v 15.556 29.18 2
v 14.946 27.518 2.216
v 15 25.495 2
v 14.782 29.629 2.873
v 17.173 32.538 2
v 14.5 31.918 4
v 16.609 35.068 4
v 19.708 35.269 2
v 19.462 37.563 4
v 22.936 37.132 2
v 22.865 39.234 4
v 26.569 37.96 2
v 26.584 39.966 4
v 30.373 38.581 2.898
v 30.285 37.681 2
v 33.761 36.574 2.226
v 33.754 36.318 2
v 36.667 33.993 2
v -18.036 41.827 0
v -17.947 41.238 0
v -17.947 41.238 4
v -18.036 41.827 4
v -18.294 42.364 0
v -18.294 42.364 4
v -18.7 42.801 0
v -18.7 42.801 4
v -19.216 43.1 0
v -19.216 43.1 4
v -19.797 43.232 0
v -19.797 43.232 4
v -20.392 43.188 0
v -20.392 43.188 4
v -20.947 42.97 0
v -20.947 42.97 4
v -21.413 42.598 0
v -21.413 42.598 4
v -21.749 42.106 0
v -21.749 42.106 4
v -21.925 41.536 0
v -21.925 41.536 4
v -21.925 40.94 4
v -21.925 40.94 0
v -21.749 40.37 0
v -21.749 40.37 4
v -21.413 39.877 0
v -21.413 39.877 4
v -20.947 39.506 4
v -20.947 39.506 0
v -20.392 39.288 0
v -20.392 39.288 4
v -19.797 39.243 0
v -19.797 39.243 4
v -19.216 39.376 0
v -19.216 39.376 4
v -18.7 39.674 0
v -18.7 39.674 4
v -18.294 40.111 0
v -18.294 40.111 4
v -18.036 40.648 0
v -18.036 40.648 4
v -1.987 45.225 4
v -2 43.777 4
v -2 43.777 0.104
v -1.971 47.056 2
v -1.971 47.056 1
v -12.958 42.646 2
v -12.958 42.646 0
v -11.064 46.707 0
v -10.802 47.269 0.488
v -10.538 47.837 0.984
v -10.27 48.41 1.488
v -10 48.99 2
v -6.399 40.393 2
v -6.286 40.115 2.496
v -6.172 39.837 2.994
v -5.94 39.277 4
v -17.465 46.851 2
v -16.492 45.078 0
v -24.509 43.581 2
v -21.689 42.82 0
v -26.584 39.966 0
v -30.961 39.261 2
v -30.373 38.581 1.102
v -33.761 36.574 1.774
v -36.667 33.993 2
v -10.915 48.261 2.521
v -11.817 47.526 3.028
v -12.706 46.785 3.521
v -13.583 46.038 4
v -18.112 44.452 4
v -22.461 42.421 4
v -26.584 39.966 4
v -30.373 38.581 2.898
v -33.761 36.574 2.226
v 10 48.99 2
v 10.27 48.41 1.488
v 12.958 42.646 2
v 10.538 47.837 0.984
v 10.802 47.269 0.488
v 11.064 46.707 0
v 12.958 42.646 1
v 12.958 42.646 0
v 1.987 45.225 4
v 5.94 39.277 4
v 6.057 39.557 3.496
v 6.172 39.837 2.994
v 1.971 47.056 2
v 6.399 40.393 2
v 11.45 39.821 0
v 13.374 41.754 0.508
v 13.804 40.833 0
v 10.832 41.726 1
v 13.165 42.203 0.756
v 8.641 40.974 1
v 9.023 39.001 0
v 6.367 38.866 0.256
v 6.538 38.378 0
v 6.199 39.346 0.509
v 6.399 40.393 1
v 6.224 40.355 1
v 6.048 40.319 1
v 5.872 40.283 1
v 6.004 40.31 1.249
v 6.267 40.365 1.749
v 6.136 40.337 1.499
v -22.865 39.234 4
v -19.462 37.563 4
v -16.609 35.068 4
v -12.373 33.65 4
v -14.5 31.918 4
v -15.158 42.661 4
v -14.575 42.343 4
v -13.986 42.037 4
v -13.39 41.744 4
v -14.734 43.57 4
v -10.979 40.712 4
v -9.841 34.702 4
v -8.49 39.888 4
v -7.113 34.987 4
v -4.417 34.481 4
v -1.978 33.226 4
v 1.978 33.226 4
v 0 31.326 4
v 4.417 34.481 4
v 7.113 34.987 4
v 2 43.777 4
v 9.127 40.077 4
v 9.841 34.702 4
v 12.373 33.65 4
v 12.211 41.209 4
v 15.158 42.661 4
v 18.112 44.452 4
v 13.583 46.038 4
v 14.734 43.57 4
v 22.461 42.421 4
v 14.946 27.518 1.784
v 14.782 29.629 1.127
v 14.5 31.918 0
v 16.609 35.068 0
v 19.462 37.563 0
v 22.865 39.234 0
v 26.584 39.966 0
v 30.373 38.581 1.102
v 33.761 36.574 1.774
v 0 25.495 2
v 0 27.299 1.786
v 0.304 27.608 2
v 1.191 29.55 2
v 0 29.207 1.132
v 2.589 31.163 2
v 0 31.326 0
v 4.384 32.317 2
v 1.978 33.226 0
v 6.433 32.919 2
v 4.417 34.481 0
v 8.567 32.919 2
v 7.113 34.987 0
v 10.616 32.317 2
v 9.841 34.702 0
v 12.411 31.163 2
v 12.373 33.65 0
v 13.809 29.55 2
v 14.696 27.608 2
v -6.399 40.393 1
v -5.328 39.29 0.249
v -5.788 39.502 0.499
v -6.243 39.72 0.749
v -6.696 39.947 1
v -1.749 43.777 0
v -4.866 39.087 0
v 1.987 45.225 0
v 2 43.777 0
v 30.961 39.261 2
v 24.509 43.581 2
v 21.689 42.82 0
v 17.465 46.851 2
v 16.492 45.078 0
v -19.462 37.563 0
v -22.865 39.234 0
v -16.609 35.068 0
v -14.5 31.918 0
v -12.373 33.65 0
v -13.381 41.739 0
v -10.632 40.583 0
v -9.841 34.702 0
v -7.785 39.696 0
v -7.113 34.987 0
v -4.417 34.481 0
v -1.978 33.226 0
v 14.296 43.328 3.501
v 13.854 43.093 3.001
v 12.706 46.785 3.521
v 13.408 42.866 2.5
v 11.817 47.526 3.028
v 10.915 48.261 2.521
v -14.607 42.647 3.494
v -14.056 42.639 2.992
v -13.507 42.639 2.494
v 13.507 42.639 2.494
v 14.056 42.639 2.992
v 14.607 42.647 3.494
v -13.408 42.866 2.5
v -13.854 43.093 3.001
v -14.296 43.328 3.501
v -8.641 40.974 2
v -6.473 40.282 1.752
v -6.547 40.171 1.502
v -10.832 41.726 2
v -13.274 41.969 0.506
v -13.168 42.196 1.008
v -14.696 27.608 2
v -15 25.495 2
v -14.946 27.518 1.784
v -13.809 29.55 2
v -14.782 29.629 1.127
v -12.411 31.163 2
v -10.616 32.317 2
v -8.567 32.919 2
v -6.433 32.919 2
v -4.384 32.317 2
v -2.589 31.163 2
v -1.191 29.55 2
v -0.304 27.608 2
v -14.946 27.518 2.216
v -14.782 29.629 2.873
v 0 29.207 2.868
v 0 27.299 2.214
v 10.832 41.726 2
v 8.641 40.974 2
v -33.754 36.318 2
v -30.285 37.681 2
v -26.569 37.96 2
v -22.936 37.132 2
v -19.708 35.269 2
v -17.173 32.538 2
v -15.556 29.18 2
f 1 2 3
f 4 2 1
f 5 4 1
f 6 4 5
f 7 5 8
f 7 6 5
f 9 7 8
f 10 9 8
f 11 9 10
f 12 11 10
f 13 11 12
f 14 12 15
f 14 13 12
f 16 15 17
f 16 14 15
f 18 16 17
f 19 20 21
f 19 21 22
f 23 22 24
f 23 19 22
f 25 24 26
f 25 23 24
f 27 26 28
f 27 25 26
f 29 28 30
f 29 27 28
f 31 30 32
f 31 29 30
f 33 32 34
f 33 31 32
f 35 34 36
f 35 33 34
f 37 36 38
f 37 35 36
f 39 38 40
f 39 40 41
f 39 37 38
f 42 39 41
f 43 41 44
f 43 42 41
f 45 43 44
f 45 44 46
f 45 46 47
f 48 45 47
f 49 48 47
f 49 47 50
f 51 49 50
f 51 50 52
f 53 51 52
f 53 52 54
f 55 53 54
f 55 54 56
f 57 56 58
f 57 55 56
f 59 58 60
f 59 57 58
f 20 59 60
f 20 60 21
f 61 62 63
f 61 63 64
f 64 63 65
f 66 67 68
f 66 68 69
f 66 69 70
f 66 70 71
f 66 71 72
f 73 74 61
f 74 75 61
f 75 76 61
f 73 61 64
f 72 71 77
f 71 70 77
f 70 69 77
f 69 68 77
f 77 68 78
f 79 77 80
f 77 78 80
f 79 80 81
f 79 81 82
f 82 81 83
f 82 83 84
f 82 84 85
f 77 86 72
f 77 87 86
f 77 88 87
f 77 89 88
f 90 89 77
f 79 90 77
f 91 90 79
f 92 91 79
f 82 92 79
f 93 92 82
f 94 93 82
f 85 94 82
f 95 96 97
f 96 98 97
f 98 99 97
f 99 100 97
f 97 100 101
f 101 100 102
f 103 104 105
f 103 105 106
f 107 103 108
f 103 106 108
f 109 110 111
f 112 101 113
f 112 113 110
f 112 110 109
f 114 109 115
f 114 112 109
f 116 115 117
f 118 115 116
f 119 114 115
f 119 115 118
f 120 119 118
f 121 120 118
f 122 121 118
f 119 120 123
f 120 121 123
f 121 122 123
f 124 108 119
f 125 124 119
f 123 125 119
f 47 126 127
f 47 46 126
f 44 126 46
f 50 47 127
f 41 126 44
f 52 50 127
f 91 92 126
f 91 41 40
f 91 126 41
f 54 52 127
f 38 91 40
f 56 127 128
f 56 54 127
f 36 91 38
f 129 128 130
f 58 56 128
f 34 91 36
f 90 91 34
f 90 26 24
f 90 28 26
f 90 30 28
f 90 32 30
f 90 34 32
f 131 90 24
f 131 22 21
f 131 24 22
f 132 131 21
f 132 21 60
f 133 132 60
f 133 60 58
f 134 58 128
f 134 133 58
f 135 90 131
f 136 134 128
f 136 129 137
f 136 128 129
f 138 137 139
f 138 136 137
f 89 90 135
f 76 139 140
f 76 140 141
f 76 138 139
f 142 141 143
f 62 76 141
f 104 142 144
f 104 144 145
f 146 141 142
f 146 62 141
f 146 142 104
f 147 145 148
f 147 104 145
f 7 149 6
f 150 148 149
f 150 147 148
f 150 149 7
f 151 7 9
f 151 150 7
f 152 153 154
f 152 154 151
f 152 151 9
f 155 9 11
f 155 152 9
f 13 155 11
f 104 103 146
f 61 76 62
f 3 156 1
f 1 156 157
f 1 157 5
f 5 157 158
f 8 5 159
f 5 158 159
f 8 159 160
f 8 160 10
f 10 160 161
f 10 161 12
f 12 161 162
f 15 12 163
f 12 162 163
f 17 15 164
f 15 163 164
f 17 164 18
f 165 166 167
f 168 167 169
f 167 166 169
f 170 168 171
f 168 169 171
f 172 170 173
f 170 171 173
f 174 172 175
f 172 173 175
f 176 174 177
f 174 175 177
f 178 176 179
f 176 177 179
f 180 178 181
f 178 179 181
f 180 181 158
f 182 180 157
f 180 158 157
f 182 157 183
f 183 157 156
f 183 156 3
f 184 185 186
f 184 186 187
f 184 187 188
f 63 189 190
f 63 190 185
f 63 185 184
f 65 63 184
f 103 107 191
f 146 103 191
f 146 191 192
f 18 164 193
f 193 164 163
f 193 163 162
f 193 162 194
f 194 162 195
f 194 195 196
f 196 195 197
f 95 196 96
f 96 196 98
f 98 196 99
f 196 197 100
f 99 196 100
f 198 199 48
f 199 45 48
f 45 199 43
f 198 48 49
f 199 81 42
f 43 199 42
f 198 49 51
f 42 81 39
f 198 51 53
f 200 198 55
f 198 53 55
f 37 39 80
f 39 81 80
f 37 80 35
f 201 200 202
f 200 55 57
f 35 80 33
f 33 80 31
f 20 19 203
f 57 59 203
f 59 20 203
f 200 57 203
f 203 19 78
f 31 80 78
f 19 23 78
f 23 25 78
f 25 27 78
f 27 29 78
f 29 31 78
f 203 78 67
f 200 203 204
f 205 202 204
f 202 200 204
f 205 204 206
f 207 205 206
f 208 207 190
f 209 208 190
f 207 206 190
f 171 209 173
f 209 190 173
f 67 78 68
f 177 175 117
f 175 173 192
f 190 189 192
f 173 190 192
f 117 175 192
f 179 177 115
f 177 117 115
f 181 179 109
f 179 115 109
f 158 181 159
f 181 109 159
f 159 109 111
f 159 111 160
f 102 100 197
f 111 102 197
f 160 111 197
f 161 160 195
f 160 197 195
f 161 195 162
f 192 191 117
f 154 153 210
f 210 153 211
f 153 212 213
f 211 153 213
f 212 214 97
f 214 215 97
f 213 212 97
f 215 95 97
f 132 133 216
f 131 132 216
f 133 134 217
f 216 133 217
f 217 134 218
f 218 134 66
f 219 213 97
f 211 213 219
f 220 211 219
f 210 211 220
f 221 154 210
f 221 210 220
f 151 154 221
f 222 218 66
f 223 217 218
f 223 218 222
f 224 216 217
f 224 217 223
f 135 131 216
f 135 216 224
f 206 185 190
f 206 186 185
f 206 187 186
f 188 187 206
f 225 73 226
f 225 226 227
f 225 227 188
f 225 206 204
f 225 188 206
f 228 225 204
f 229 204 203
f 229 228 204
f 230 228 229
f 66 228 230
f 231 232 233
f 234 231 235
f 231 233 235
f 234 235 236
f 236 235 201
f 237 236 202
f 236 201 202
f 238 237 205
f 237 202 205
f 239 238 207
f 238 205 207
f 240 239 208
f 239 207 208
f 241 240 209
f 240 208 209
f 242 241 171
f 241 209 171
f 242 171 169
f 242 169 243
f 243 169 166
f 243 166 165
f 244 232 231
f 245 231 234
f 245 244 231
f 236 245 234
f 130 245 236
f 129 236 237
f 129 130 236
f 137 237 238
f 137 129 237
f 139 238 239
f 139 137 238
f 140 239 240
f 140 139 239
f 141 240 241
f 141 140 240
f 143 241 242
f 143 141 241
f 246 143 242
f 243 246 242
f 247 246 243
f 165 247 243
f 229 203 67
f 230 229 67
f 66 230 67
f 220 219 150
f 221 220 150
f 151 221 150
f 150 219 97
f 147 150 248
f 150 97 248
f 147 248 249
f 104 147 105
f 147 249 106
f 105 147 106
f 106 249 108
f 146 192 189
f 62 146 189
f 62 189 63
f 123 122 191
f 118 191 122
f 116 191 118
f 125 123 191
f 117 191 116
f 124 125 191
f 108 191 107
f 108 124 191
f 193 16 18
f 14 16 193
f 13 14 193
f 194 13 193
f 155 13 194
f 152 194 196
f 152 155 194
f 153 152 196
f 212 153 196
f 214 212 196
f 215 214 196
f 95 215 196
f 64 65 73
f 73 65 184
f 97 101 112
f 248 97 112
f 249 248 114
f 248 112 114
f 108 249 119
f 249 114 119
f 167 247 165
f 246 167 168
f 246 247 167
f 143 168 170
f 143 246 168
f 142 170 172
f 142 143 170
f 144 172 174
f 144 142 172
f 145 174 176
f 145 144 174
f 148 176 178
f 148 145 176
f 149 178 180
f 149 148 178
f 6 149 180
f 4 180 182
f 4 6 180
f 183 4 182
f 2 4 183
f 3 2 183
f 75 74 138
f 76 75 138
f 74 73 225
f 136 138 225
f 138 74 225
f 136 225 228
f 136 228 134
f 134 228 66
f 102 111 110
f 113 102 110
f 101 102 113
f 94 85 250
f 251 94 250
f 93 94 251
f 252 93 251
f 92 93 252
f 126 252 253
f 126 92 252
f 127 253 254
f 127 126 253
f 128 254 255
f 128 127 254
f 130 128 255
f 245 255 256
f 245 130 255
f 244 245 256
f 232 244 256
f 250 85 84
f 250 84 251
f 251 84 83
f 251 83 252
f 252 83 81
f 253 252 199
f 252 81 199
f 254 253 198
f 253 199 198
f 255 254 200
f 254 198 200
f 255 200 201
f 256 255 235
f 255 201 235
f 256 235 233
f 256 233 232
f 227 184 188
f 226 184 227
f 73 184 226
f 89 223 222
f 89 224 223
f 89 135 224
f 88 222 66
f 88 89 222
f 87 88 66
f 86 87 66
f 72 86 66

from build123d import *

# Parameters (mm, degrees)
F0_R          = 2
F1_DEPTH      = 4
F2_C1_SIZE    = 2
F2_C2_SIZE    = 1.9999
F2_C3_SIZE    = 2
F2_C4_SIZE    = 2
F2_C5_SIZE    = 2
F2_C6_SIZE    = 1.9999
F2_C7_SIZE    = 2
F2_C8_SIZE    = 1.9999
F2_C9_SIZE    = 2
F2_C10_SIZE   = 1.9999
F2_C11_SIZE   = 2
F2_C12_SIZE   = 1.9999
F2_C13_SIZE   = 2
F2_C14_SIZE   = 1.9999
F3_T4_ANGLE   = 23.1676243984
F3_T9_ANGLE   = 33.0601284412
F3_T15_ANGLE  = 23.1676243984
F3_T20_ANGLE  = 33.0601284412
F3_T26_DEPTH  = 18.3593154951
F3_S27_R      = 30
F3_T28_DEPTH  = 11
F3_T32_DEPTH  = 18.3593154951
F3_S33_R      = 30
F3_T34_DEPTH  = 12
F3_T38_DEPTH  = 18.3593154951
F3_S39_R      = 30
F3_T40_DEPTH  = 11
F3_T44_DEPTH  = 18.3593154951
F3_S45_R      = 30
F3_T46_DEPTH  = 11
F3_T50_ANGLE  = 13.7165010336
F3_T55_ANGLE  = 13.7165010336
F3_T61_ANGLE  = 23.1676243984
F3_T65_DEPTH  = 18.3593154951
F3_S66_R      = 30
F3_T67_DEPTH  = 11
F3_T73_ANGLE  = 33.0601284412
F3_T77_DEPTH  = 18.3593154951
F3_S78_R      = 30
F3_T79_DEPTH  = 12
F3_T85_ANGLE  = 23.1676243984
F3_T89_DEPTH  = 18.3593154951
F3_S90_R      = 30
F3_T91_DEPTH  = 11
F3_T97_ANGLE  = 33.0601284412
F3_T101_DEPTH = 18.3593154951
F3_S102_R     = 30
F3_T103_DEPTH = 11


# Not quite as in the source:
# - a fillet or chamfer that OpenCascade refuses, or shapes differently, is made with other operations: its cross-section is extruded or revolved along the edge and cut away or added
# - a fillet or chamfer is up to 0.001 mm smaller than in the source, because OpenCascade refuses the exact size


with BuildPart() as f1:
    # F0 (on Top) → F1 (new body)
    with BuildSketch(Plane.XY):
        with BuildLine():
            Line((-12.9583278322, 42.6456403464), (-10, 48.9897948557))
            ThreePointArc((-10, 48.9897948557), (-24.5085073708, 43.5813385115), (-36.6666666667, 33.993463424))
            ThreePointArc((-36.6666666667, 33.993463424), (-22.9356453541, 37.1319642711), (-15, 25.495097568))
            ThreePointArc((-15, 25.495097568), (-7.5, 32.995097568), (0, 25.495097568))
            ThreePointArc((0, 25.495097568), (7.5, 32.995097568), (15, 25.495097568))
            ThreePointArc((15, 25.495097568), (22.9356453541, 37.1319642711), (36.6666666667, 33.993463424))
            ThreePointArc((36.6666666667, 33.993463424), (24.5085073708, 43.5813385115), (10, 48.9897948557))
            Line((10, 48.9897948557), (12.9583278322, 42.6456403464))
            ThreePointArc((12.9583278322, 42.6456403464), (9.7439963261, 41.3291664505), (6.3990408051, 40.3930558198))
            ThreePointArc((6.3990408051, 40.3930558198), (0, 39.702649416), (-6.3990408051, 40.3930558198))
            ThreePointArc((-6.3990408051, 40.3930558198), (-9.7439963261, 41.3291664505), (-12.9583278322, 42.6456403464))
        make_face()
        with Locations((-19.9469160289, 41.2377901375)):
            Circle(F0_R, mode=Mode.SUBTRACT)
        with BuildLine():
            Line((-1.9713696092, 47.056067735), (-6.3990408051, 40.3930558198))
            ThreePointArc((-6.3990408051, 40.3930558198), (0, 39.702649416), (6.3990408051, 40.3930558198))
            Line((6.3990408051, 40.3930558198), (1.9713696092, 47.056067735))
            Line((1.9713696092, 47.056067735), (2, 43.7767133248))
            Line((2, 43.7767133248), (0, 43.7767133248))
            Line((0, 43.7767133248), (-2, 43.7767133248))
            Line((-2, 43.7767133248), (-1.9713696092, 47.056067735))
        make_face()
    extrude(amount=F1_DEPTH)

    # F2: chamfer of 2 on 14 edges, made by hand

    # F2_c1
    f2_c1_edges = [f1.edges().sort_by_distance(p)[0] for p in [
        (24.5085073708, 43.5813385115, 0),
    ]]
    chamfer(f2_c1_edges, length=F2_C1_SIZE)

    # F2_c2 (size 2 in the source; OpenCascade refuses exactly that, so slightly less here)
    f2_c2_edges = [f1.edges().sort_by_distance(p)[0] for p in [
        (24.5085073708, 43.5813385115, 4),
    ]]
    chamfer(f2_c2_edges, length=F2_C2_SIZE)

    # F2_c3
    f2_c3_edges = [f1.edges().sort_by_distance(p)[0] for p in [
        (12.011285826, 44.6765784827, 4),
    ]]
    chamfer(f2_c3_edges, length=F2_C3_SIZE)

    # F2_c4
    f2_c4_edges = [f1.edges().sort_by_distance(p)[0] for p in [
        (-11.4791639161, 45.817717601, 4),
    ]]
    chamfer(f2_c4_edges, length=F2_C4_SIZE)

    # F2_c5
    f2_c5_edges = [f1.edges().sort_by_distance(p)[0] for p in [
        (-24.5085073708, 43.5813385115, 0),
    ]]
    chamfer(f2_c5_edges, length=F2_C5_SIZE)

    # F2_c6 (size 2 in the source; OpenCascade refuses exactly that, so slightly less here)
    f2_c6_edges = [f1.edges().sort_by_distance(p)[0] for p in [
        (-25.6065907207, 42.9453433059, 4),
    ]]
    chamfer(f2_c6_edges, length=F2_C6_SIZE)

    # F2_c7
    f2_c7_edges = [f1.edges().sort_by_distance(p)[0] for p in [
        (-19.4184053045, 35.031230284, 0),
    ]]
    chamfer(f2_c7_edges, length=F2_C7_SIZE)

    # F2_c8 (size 2 in the source; OpenCascade refuses exactly that, so slightly less here)
    f2_c8_edges = [f1.edges().sort_by_distance(p)[0] for p in [
        (-19.4184850979, 35.031297906, 4),
    ]]
    chamfer(f2_c8_edges, length=F2_C8_SIZE)

    # F2_c9
    f2_c9_edges = [f1.edges().sort_by_distance(p)[0] for p in [
        (-5.25, 32.6496415786, 0),
    ]]
    chamfer(f2_c9_edges, length=F2_C9_SIZE)

    # F2_c10 (size 2 in the source; OpenCascade refuses exactly that, so slightly less here)
    f2_c10_edges = [f1.edges().sort_by_distance(p)[0] for p in [
        (-5.2500604173, 32.6496605787, 4),
    ]]
    chamfer(f2_c10_edges, length=F2_C10_SIZE)

    # F2_c11
    f2_c11_edges = [f1.edges().sort_by_distance(p)[0] for p in [
        (9.5615528128, 32.7062001189, 0),
    ]]
    chamfer(f2_c11_edges, length=F2_C11_SIZE)

    # F2_c12 (size 2 in the source; OpenCascade refuses exactly that, so slightly less here)
    f2_c12_edges = [f1.edges().sort_by_distance(p)[0] for p in [
        (9.5614952101, 32.7062165864, 4),
    ]]
    chamfer(f2_c12_edges, length=F2_C12_SIZE)

    # F2_c13
    f2_c13_edges = [f1.edges().sort_by_distance(p)[0] for p in [
        (21.3153564799, 36.3578865528, 0),
    ]]
    chamfer(f2_c13_edges, length=F2_C13_SIZE)

    # F2_c14 (size 2 in the source; OpenCascade refuses exactly that, so slightly less here)
    f2_c14_edges = [f1.edges().sort_by_distance(p)[0] for p in [
        (21.3153904307, 36.3579058824, 4),
    ]]
    chamfer(f2_c14_edges, length=F2_C14_SIZE)

    # F3: chamfer of 2 x 1 on 8 edges, made by hand


with BuildPart() as f3_tool2:
    # F3_s3 → F3_t4 (revolve)
    with BuildSketch(Plane(origin=(-2.9446339923, 0.1246207965, 0), x_dir=(0, 0, 1), z_dir=(0.9991056542, -0.0422834698, 0))):
        Polygon((4, -38.6403111418), (2, -39.6403111418), (4, -39.6403111418), align=None)
    revolve(axis=Axis((0, 69.702649416, 4), (0, 0, -1)), revolution_arc=F3_T4_ANGLE)

    split(bisect_by=Plane(origin=(-23.0586077624, 15.3227901596, 0), x_dir=(0, 0, 1), z_dir=(-0.8328764894, 0.5534588995, 0)), keep=Keep.TOP)


with BuildPart() as f1_1:
    add(f1.part)

    # F3_t1: cut F3_tool2
    add(f3_tool2.part, mode=Mode.SUBTRACT)


with BuildPart() as f3_tool7:
    # F3_s8 → F3_t9 (revolve)
    with BuildSketch(Plane(origin=(-2.9446339923, 0.1246207965, 0), x_dir=(0, 0, 1), z_dir=(0.9991056542, -0.0422834698, 0))):
        Polygon((0, -38.6403111418), (2, -39.6403111418), (0, -39.6403111418), align=None)
    revolve(axis=Axis((0, 69.702649416, 0), (0, 0, -1)), revolution_arc=F3_T9_ANGLE)

    split(bisect_by=Plane(origin=(-23.0586077624, 15.3227901596, 0), x_dir=(0, 0, 1), z_dir=(-0.8328764894, 0.5534588995, 0)), keep=Keep.TOP)

    split(bisect_by=Plane(origin=(-26.9781181078, 12.5801030763, 0), x_dir=(0, 0, 1), z_dir=(0.906307787, -0.4226182617, 0)), keep=Keep.TOP)


with BuildPart() as f1_2:
    add(f1_1.part)

    # F3_t6: cut F3_tool7
    add(f3_tool7.part, mode=Mode.SUBTRACT)


with BuildPart() as f3_tool13:
    # F3_s14 → F3_t15 (revolve)
    with BuildSketch(Plane(origin=(27.1541071122, 13.0048306908, 0), x_dir=(0, 0, 1), z_dir=(0.9019003023, 0.4319442611, 0))):
        Polygon((4, -31.8648405809), (2, -32.8648405809), (4, -32.8648405809), align=None)
    revolve(axis=Axis((0, 69.702649416, 4), (0, 0, -1)), revolution_arc=F3_T15_ANGLE)

    split(bisect_by=Plane(origin=(23.0586077624, 15.3227901596, 0), x_dir=(0, 0, 1), z_dir=(0.8328764894, 0.5534588995, 0)), keep=Keep.TOP)


with BuildPart() as f1_3:
    add(f1_2.part)

    # F3_t12: cut F3_tool13
    add(f3_tool13.part, mode=Mode.SUBTRACT)


with BuildPart() as f3_tool18:
    # F3_s19 → F3_t20 (revolve)
    with BuildSketch(Plane(origin=(32.9460403942, 23.4858833946, 0), x_dir=(0, 0, 1), z_dir=(0.8142825601, 0.5804687006, 0))):
        Polygon((0, -24.7576518113), (1, -26.7576518113), (0, -26.7576518113), align=None)
    revolve(axis=Axis((0, 69.702649416, 0), (0, 0, -1)), revolution_arc=F3_T20_ANGLE)

    split(bisect_by=Plane(origin=(23.0586077624, 15.3227901596, 0), x_dir=(0, 0, 1), z_dir=(0.8328764894, 0.5534588995, 0)), keep=Keep.TOP)

    split(bisect_by=Plane(origin=(26.9781181078, 12.5801030763, 0), x_dir=(0, 0, 1), z_dir=(-0.906307787, -0.4226182617, 0)), keep=Keep.TOP)


with BuildPart() as f1_4:
    add(f1_3.part)

    # F3_t17: cut F3_tool18
    add(f3_tool18.part, mode=Mode.SUBTRACT)


with BuildPart() as f3_tool24:
    # F3_s25 → F3_t26 (new body)
    with BuildSketch(Plane(origin=(23.9539658298, 36.0472927364, 0), x_dir=(0, 0, 1), z_dir=(-0.5534588995, -0.8328764894, 0))):
        Polygon((4, 26.6855068621), (2, 27.6855068621), (4, 27.6855068621), align=None)
    extrude(amount=F3_T26_DEPTH)

    # F3_s27 → F3_t28 (intersect, symmetric)
    with BuildSketch(Plane.XY.offset(3)):
        with Locations((0, 69.702649416)):
            Circle(F3_S27_R)
    extrude(amount=F3_T28_DEPTH, both=True, mode=Mode.INTERSECT)


with BuildPart() as f1_5:
    add(f1_4.part)

    # F3_t23: cut F3_tool24
    add(f3_tool24.part, mode=Mode.SUBTRACT)


with BuildPart() as f3_tool30:
    # F3_s31 → F3_t32 (new body)
    with BuildSketch(Plane(origin=(23.9539658298, 36.0472927364, 0), x_dir=(0, 0, 1), z_dir=(-0.5534588995, -0.8328764894, 0))):
        Polygon((0, 25.6855068621), (1, 27.6855068621), (0, 27.6855068621), align=None)
    extrude(amount=F3_T32_DEPTH)

    # F3_s33 → F3_t34 (intersect, symmetric)
    with BuildSketch(Plane.XY.offset(0.5)):
        with Locations((0, 69.702649416)):
            Circle(F3_S33_R)
    extrude(amount=F3_T34_DEPTH, both=True, mode=Mode.INTERSECT)


with BuildPart() as f1_6:
    add(f1_5.part)

    # F3_t29: cut F3_tool30
    add(f3_tool30.part, mode=Mode.SUBTRACT)


with BuildPart() as f3_tool36:
    # F3_s37 → F3_t38 (new body)
    with BuildSketch(Plane(origin=(-13.7928392805, 20.7562504992, 0), x_dir=(0, 0, 1), z_dir=(-0.5534588995, 0.8328764894, 0))):
        Polygon((4, 26.6855068621), (2, 27.6855068621), (4, 27.6855068621), align=None)
    extrude(amount=F3_T38_DEPTH)

    # F3_s39 → F3_t40 (intersect, symmetric)
    with BuildSketch(Plane.XY.offset(3)):
        with Locations((0, 69.702649416)):
            Circle(F3_S39_R)
    extrude(amount=F3_T40_DEPTH, both=True, mode=Mode.INTERSECT)


with BuildPart() as f1_7:
    add(f1_6.part)

    # F3_t35: cut F3_tool36
    add(f3_tool36.part, mode=Mode.SUBTRACT)


with BuildPart() as f3_tool42:
    # F3_s43 → F3_t44 (new body)
    with BuildSketch(Plane(origin=(-13.7928392805, 20.7562504992, 0), x_dir=(0, 0, 1), z_dir=(-0.5534588995, 0.8328764894, 0))):
        Polygon((0, 26.6855068621), (2, 27.6855068621), (0, 27.6855068621), align=None)
    extrude(amount=F3_T44_DEPTH)

    # F3_s45 → F3_t46 (intersect, symmetric)
    with BuildSketch(Plane.XY.offset(1)):
        with Locations((0, 69.702649416)):
            Circle(F3_S45_R)
    extrude(amount=F3_T46_DEPTH, both=True, mode=Mode.INTERSECT)


with BuildPart() as f1_8:
    add(f1_7.part)

    # F3_t41: cut F3_tool42
    add(f3_tool42.part, mode=Mode.SUBTRACT)


with BuildPart() as f3_tool48:
    # F3_s49 → F3_t50 (revolve)
    with BuildSketch(Plane(origin=(27.1541071122, 13.0048306908, 0), x_dir=(0, 0, 1), z_dir=(-0.9019003023, -0.4319442611, 0))):
        Polygon((4, 31.8648405809), (2, 32.8648405809), (4, 32.8648405809), align=None)
    revolve(axis=Axis((0, 69.702649416, 4), (0, 0, 1)), revolution_arc=F3_T50_ANGLE)

    split(bisect_by=Plane(origin=(12.5827512669, 5.8674332764, -13.8835299077), x_dir=(0.4226182617, -0.906307787, 0), z_dir=(-0.6408563821, -0.2988362387, 0.7071067812)), keep=Keep.TOP)


with BuildPart() as f1_9:
    add(f1_8.part)

    # F3_t47: cut F3_tool48
    add(f3_tool48.part, mode=Mode.SUBTRACT)


with BuildPart() as f3_tool53:
    # F3_s54 → F3_t55 (revolve)
    with BuildSketch(Plane(origin=(-27.1541071122, 13.0048306908, 0), x_dir=(0, 0, 1), z_dir=(0.9019003023, -0.4319442611, 0))):
        Polygon((4, -31.8648405809), (2, -32.8648405809), (4, -32.8648405809), align=None)
    revolve(axis=Axis((0, 69.702649416, 4), (0, 0, -1)), revolution_arc=F3_T55_ANGLE)

    split(bisect_by=Plane(origin=(-12.5827512669, 5.8674332764, -13.8835299077), x_dir=(0.4226182617, 0.906307787, 0), z_dir=(0.6408563821, -0.2988362387, 0.7071067812)), keep=Keep.TOP)


with BuildPart() as f1_10:
    add(f1_9.part)

    # F3_t52: cut F3_tool53
    add(f3_tool53.part, mode=Mode.SUBTRACT)


with BuildPart() as f3_tool59:
    # F3_s60 → F3_t61 (revolve)
    with BuildSketch(Plane(origin=(-2.9446339923, 0.1246207965, 0), x_dir=(0, 0, 1), z_dir=(0.9991056542, -0.0422834698, 0))):
        Polygon((4, -38.6403111418), (2, -39.6403111418), (4, -39.6403111418), align=None)
    revolve(axis=Axis((0, 69.702649416, 4), (0, 0, -1)), revolution_arc=F3_T61_ANGLE)

    split(bisect_by=Plane(origin=(-23.0586077624, 15.3227901596, 0), x_dir=(0, 0, 1), z_dir=(0.8328764894, -0.5534588995, 0)), keep=Keep.TOP)


with BuildPart() as f3_tool63:
    # F3_s64 → F3_t65 (new body)
    with BuildSketch(Plane(origin=(23.9539658298, 36.0472927364, 0), x_dir=(0, 0, 1), z_dir=(-0.5534588995, -0.8328764894, 0))):
        Polygon((4, 26.6855068621), (2, 27.6855068621), (4, 27.6855068621), align=None)
    extrude(amount=F3_T65_DEPTH)

    # F3_s66 → F3_t67 (cut, symmetric)
    with BuildSketch(Plane.XY.offset(3)):
        with Locations((0, 69.702649416)):
            Circle(F3_S66_R)
    extrude(amount=F3_T67_DEPTH, both=True, mode=Mode.SUBTRACT)


with BuildPart() as f3_tool59_1:
    add(f3_tool59.part)

    # F3_t68: intersect F3_tool63
    add(f3_tool63.part, mode=Mode.INTERSECT)


with BuildPart() as f1_11:
    add(f1_10.part)

    # F3_t57: cut F3_tool59
    add(f3_tool59_1.part, mode=Mode.SUBTRACT)


with BuildPart() as f3_tool71:
    # F3_s72 → F3_t73 (revolve)
    with BuildSketch(Plane(origin=(-2.9446339923, 0.1246207965, 0), x_dir=(0, 0, 1), z_dir=(0.9991056542, -0.0422834698, 0))):
        Polygon((0, -38.6403111418), (2, -39.6403111418), (0, -39.6403111418), align=None)
    revolve(axis=Axis((0, 69.702649416, 0), (0, 0, -1)), revolution_arc=F3_T73_ANGLE)

    split(bisect_by=Plane(origin=(-23.0586077624, 15.3227901596, 0), x_dir=(0, 0, 1), z_dir=(0.8328764894, -0.5534588995, 0)), keep=Keep.TOP)


with BuildPart() as f3_tool75:
    # F3_s76 → F3_t77 (new body)
    with BuildSketch(Plane(origin=(23.9539658298, 36.0472927364, 0), x_dir=(0, 0, 1), z_dir=(-0.5534588995, -0.8328764894, 0))):
        Polygon((0, 25.6855068621), (1, 27.6855068621), (0, 27.6855068621), align=None)
    extrude(amount=F3_T77_DEPTH)

    # F3_s78 → F3_t79 (cut, symmetric)
    with BuildSketch(Plane.XY.offset(0.5)):
        with Locations((0, 69.702649416)):
            Circle(F3_S78_R)
    extrude(amount=F3_T79_DEPTH, both=True, mode=Mode.SUBTRACT)


with BuildPart() as f3_tool71_1:
    add(f3_tool71.part)

    # F3_t80: intersect F3_tool75
    add(f3_tool75.part, mode=Mode.INTERSECT)


with BuildPart() as f1_12:
    add(f1_11.part)

    # F3_t69: cut F3_tool71
    add(f3_tool71_1.part, mode=Mode.SUBTRACT)


with BuildPart() as f3_tool83:
    # F3_s84 → F3_t85 (revolve)
    with BuildSketch(Plane(origin=(27.1541071122, 13.0048306908, 0), x_dir=(0, 0, 1), z_dir=(0.9019003023, 0.4319442611, 0))):
        Polygon((4, -31.8648405809), (2, -32.8648405809), (4, -32.8648405809), align=None)
    revolve(axis=Axis((0, 69.702649416, 4), (0, 0, -1)), revolution_arc=F3_T85_ANGLE)

    split(bisect_by=Plane(origin=(23.0586077624, 15.3227901596, 0), x_dir=(0, 0, 1), z_dir=(-0.8328764894, -0.5534588995, 0)), keep=Keep.TOP)


with BuildPart() as f3_tool87:
    # F3_s88 → F3_t89 (new body)
    with BuildSketch(Plane(origin=(-13.7928392805, 20.7562504992, 0), x_dir=(0, 0, 1), z_dir=(-0.5534588995, 0.8328764894, 0))):
        Polygon((4, 26.6855068621), (2, 27.6855068621), (4, 27.6855068621), align=None)
    extrude(amount=F3_T89_DEPTH)

    # F3_s90 → F3_t91 (cut, symmetric)
    with BuildSketch(Plane.XY.offset(3)):
        with Locations((0, 69.702649416)):
            Circle(F3_S90_R)
    extrude(amount=F3_T91_DEPTH, both=True, mode=Mode.SUBTRACT)


with BuildPart() as f3_tool83_1:
    add(f3_tool83.part)

    # F3_t92: intersect F3_tool87
    add(f3_tool87.part, mode=Mode.INTERSECT)


with BuildPart() as f1_13:
    add(f1_12.part)

    # F3_t81: cut F3_tool83
    add(f3_tool83_1.part, mode=Mode.SUBTRACT)


with BuildPart() as f3_tool95:
    # F3_s96 → F3_t97 (revolve)
    with BuildSketch(Plane(origin=(32.9460403942, 23.4858833946, 0), x_dir=(0, 0, 1), z_dir=(0.8142825601, 0.5804687006, 0))):
        Polygon((0, -24.7576518113), (1, -26.7576518113), (0, -26.7576518113), align=None)
    revolve(axis=Axis((0, 69.702649416, 0), (0, 0, -1)), revolution_arc=F3_T97_ANGLE)

    split(bisect_by=Plane(origin=(23.0586077624, 15.3227901596, 0), x_dir=(0, 0, 1), z_dir=(-0.8328764894, -0.5534588995, 0)), keep=Keep.TOP)


with BuildPart() as f3_tool99:
    # F3_s100 → F3_t101 (new body)
    with BuildSketch(Plane(origin=(-13.7928392805, 20.7562504992, 0), x_dir=(0, 0, 1), z_dir=(-0.5534588995, 0.8328764894, 0))):
        Polygon((0, 26.6855068621), (2, 27.6855068621), (0, 27.6855068621), align=None)
    extrude(amount=F3_T101_DEPTH)

    # F3_s102 → F3_t103 (cut, symmetric)
    with BuildSketch(Plane.XY.offset(1)):
        with Locations((0, 69.702649416)):
            Circle(F3_S102_R)
    extrude(amount=F3_T103_DEPTH, both=True, mode=Mode.SUBTRACT)


with BuildPart() as f3_tool95_1:
    add(f3_tool95.part)

    # F3_t104: intersect F3_tool99
    add(f3_tool99.part, mode=Mode.INTERSECT)


with BuildPart() as f1_14:
    add(f1_13.part)

    # F3_t93: cut F3_tool95
    add(f3_tool95_1.part, mode=Mode.SUBTRACT)


solid = f1_14.part
